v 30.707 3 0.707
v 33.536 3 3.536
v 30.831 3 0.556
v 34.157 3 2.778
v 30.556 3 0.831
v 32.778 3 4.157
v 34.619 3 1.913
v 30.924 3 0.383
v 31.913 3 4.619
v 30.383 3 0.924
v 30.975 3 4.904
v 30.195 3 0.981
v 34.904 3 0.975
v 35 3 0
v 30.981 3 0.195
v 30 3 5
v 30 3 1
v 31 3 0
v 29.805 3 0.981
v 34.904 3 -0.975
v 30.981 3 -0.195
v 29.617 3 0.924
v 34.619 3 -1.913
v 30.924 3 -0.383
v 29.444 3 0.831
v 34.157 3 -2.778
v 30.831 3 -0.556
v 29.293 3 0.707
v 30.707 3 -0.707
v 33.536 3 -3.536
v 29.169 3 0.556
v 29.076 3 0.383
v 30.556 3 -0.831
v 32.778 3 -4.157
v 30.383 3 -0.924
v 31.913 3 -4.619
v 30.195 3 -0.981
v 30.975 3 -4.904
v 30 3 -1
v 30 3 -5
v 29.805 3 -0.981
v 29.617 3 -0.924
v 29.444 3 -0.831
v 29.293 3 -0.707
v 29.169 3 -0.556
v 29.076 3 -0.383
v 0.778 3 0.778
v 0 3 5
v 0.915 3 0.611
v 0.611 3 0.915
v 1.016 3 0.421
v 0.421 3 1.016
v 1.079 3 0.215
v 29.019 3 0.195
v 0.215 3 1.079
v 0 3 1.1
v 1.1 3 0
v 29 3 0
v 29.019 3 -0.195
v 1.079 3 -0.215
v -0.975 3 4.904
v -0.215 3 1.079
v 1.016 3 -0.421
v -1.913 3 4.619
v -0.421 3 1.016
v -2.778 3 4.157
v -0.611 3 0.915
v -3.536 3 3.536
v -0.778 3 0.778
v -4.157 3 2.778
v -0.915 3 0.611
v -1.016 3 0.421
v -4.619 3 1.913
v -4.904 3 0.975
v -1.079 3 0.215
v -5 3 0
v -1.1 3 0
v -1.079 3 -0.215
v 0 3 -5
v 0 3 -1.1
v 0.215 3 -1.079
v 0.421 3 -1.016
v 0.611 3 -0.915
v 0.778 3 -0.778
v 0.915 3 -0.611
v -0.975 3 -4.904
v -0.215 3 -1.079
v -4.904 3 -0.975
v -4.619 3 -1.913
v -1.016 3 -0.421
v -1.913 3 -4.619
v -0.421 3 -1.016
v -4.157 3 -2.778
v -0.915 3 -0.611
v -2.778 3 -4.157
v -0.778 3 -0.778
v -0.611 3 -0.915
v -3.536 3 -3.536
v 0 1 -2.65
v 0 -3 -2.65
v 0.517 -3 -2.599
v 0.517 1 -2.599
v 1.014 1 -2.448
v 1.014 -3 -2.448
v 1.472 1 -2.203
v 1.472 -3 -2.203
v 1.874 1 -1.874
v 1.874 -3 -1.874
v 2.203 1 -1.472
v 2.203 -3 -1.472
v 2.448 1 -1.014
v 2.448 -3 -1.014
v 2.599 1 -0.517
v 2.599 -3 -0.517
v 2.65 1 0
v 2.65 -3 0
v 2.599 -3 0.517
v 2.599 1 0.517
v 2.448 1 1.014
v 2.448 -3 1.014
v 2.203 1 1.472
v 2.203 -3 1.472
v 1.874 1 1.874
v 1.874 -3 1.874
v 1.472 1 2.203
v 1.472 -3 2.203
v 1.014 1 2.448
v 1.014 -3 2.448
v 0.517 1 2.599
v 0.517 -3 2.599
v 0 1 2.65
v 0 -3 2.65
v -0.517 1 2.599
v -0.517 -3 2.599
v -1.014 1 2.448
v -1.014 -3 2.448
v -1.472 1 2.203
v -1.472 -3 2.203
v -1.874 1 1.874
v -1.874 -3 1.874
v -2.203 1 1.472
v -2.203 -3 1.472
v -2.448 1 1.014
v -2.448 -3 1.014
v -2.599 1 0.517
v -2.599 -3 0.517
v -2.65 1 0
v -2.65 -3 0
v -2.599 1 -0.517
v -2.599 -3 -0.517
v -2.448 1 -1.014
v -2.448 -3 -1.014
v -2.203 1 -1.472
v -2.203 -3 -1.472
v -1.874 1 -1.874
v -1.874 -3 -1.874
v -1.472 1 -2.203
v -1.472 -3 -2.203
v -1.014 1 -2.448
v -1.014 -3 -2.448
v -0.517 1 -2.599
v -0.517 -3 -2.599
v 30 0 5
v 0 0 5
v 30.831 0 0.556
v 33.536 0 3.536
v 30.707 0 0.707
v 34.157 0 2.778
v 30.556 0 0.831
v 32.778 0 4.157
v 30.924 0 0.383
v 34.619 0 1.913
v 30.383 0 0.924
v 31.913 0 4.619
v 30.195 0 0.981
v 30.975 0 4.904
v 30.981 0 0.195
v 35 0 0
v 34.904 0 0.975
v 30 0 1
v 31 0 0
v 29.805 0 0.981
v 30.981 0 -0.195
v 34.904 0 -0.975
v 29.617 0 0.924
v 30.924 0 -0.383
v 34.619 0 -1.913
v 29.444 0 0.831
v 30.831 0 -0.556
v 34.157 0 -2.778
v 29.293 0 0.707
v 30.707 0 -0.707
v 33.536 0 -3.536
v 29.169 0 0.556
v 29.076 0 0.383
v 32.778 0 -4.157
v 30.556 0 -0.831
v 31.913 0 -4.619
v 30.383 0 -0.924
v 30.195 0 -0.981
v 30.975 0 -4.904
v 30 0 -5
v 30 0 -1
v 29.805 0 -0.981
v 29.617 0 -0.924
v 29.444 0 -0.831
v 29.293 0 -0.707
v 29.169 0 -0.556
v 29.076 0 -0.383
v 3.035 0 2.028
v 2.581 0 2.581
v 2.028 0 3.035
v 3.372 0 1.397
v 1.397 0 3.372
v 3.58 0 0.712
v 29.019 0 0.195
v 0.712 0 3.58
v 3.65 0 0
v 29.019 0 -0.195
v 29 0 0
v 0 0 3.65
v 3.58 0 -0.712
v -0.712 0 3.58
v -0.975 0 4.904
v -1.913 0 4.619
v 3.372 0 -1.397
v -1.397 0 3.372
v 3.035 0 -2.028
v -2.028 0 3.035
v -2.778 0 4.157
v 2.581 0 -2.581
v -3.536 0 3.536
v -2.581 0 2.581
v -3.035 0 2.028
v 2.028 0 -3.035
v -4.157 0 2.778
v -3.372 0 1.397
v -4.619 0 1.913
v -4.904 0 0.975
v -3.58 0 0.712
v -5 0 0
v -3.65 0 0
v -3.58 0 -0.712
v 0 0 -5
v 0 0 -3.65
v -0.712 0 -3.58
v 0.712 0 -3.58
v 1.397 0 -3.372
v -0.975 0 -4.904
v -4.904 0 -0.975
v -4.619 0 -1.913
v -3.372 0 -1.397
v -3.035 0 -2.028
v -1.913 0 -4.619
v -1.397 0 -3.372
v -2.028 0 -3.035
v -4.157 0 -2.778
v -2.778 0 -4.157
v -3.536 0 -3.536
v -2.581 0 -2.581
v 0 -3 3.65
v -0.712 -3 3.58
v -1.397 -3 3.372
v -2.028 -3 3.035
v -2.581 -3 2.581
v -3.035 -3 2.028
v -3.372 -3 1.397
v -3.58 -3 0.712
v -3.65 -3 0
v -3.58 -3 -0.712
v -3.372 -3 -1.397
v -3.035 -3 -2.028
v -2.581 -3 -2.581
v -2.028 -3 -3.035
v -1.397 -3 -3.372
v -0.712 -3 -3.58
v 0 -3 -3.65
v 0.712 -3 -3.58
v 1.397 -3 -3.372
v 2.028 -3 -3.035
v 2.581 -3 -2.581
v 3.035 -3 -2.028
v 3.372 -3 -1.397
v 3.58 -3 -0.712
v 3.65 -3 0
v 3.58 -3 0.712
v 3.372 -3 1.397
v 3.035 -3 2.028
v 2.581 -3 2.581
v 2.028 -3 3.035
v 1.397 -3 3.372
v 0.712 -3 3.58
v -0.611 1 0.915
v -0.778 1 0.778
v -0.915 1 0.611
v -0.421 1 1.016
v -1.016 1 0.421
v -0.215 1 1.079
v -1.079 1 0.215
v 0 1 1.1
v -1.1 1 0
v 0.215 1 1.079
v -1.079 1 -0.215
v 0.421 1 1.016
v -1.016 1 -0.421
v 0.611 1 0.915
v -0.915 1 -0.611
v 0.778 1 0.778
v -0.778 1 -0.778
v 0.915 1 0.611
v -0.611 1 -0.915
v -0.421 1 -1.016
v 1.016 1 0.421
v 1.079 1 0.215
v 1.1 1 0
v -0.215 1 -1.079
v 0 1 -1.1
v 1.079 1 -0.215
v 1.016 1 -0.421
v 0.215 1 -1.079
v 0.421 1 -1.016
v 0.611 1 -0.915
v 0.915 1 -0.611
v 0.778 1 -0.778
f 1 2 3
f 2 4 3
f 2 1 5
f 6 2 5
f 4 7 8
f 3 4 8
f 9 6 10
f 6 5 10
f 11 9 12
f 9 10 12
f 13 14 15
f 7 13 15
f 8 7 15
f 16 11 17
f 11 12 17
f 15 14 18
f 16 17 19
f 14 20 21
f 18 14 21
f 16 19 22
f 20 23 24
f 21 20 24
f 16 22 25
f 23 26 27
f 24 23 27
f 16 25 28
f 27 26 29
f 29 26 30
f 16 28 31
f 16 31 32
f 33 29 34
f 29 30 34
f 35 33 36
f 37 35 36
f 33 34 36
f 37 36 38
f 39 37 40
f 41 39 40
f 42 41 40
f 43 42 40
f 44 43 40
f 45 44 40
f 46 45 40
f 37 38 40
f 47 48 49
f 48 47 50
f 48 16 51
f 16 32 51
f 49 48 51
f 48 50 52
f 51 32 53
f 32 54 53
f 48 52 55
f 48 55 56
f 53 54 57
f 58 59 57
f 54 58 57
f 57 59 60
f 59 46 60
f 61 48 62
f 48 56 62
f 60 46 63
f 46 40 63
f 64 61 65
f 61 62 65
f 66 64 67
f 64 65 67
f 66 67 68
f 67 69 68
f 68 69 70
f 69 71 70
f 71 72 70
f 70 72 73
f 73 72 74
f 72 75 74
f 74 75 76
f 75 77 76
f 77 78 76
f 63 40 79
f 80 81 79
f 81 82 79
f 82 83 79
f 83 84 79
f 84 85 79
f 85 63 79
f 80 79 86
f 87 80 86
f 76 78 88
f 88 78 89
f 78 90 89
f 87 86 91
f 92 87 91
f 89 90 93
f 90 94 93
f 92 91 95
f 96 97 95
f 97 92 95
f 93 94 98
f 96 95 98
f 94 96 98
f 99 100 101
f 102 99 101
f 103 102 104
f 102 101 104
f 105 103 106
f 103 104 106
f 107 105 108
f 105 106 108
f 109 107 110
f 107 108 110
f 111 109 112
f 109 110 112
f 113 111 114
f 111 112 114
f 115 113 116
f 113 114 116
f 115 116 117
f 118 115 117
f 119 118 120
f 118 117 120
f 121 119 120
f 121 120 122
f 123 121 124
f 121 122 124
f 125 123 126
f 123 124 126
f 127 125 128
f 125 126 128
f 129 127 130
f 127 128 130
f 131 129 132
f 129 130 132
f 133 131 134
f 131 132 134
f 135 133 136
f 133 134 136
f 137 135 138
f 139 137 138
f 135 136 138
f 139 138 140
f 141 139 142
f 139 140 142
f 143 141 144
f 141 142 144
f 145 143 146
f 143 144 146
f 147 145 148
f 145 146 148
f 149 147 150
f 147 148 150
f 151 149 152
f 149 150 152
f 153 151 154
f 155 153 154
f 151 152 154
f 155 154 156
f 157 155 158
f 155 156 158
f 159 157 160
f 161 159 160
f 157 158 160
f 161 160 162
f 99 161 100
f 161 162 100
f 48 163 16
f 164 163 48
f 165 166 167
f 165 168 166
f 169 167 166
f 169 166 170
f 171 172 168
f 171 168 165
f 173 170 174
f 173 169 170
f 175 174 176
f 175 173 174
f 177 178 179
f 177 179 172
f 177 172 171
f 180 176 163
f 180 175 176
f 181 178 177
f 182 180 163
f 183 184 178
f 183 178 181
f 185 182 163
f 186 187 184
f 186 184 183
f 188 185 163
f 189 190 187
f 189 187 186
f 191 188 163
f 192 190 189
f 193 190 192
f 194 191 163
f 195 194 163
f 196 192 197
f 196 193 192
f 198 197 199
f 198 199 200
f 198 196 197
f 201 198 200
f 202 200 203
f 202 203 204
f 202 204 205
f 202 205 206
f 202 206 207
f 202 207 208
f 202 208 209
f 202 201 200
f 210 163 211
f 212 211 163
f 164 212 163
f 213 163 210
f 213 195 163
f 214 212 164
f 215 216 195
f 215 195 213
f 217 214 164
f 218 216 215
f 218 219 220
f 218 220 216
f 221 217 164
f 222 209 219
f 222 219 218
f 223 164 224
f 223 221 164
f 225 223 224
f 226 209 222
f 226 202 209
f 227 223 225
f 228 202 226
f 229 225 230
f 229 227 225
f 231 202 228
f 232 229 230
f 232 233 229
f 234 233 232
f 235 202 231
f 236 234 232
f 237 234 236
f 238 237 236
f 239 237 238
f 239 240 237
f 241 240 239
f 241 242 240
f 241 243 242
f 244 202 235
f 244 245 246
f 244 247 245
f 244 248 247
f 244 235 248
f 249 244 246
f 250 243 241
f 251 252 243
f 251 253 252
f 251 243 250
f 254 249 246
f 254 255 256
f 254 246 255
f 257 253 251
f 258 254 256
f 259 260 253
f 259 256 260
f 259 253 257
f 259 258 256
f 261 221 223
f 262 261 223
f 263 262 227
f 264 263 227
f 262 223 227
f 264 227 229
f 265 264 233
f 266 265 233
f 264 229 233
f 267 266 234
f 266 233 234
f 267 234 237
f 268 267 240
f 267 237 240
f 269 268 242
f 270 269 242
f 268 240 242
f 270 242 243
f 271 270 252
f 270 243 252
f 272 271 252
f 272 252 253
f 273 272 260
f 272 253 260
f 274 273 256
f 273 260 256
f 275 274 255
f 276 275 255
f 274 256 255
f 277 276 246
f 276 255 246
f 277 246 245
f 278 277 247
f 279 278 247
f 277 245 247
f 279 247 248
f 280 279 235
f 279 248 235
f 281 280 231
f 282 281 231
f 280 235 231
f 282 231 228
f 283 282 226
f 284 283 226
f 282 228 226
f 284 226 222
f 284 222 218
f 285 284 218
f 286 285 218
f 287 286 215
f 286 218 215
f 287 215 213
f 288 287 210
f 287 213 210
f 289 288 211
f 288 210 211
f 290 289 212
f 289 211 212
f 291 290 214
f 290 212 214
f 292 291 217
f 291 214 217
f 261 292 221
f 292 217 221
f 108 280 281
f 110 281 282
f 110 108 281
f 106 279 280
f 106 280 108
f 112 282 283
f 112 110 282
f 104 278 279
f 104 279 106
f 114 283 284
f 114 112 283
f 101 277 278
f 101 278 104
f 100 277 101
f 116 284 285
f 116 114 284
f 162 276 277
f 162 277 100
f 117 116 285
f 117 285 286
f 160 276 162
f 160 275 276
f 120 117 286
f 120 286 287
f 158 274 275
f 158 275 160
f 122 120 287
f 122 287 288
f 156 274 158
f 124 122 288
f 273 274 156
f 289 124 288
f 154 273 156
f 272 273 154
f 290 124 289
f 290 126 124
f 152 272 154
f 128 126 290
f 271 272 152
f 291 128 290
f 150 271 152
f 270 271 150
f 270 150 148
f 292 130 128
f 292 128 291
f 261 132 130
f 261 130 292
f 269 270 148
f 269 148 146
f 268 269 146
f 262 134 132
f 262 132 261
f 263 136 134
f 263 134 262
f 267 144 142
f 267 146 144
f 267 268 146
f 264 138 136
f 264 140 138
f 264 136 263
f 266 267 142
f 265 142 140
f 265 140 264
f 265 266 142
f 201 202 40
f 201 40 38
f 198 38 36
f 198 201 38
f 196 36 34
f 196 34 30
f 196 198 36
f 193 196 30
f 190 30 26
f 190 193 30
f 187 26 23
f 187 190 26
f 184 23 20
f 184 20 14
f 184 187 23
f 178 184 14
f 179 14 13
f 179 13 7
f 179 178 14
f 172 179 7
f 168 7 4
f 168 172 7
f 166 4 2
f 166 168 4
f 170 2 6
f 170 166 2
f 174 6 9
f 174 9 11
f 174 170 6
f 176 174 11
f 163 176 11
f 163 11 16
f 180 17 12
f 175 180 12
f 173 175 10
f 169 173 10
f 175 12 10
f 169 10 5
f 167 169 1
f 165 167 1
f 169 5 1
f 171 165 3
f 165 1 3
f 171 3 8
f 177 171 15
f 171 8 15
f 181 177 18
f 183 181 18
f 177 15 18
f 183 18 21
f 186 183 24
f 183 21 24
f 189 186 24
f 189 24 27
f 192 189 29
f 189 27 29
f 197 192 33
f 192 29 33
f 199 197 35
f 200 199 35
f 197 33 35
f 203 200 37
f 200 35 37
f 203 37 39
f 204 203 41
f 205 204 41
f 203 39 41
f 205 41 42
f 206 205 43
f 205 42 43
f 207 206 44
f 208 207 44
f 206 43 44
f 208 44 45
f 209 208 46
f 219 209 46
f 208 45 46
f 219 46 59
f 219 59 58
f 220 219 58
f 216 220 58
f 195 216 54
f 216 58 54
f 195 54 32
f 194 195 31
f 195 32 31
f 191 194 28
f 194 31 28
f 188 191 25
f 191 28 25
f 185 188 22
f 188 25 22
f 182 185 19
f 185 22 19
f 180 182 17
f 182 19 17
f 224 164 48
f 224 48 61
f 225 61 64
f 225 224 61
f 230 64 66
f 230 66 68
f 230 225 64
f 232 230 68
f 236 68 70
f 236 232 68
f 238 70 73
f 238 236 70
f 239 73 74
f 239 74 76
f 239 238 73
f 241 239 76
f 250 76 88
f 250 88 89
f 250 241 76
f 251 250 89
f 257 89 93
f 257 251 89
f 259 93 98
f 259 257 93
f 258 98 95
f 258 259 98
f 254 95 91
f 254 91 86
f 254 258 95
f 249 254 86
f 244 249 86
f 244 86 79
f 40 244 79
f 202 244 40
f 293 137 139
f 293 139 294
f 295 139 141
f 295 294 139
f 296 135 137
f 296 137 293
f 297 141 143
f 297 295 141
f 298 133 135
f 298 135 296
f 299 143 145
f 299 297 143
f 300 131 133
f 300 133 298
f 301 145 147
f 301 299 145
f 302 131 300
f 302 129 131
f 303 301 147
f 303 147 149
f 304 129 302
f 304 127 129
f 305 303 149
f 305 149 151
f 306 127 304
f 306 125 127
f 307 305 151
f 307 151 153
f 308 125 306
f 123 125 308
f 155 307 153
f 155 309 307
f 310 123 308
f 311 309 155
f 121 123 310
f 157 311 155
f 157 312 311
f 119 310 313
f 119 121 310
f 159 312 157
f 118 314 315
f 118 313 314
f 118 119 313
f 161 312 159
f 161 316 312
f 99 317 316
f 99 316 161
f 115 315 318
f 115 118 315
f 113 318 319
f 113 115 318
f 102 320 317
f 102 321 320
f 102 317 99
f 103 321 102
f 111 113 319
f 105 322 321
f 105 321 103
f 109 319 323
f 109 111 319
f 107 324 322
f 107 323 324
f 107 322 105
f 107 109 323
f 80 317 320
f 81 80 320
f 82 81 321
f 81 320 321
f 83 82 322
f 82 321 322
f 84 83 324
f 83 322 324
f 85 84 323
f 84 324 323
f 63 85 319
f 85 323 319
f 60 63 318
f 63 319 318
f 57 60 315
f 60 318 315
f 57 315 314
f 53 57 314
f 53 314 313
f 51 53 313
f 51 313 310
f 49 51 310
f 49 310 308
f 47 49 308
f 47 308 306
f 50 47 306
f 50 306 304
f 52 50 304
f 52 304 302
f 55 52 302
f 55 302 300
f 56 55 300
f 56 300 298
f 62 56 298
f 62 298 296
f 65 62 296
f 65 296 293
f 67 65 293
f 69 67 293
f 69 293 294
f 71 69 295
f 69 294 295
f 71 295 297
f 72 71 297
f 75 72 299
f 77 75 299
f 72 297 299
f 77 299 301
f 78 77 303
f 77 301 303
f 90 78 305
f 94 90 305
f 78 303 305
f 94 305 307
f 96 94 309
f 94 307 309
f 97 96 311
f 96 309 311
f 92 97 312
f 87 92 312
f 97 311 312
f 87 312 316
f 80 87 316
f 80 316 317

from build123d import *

# Parameters (mm, degrees)
BOSS_EXTRUDE1_DEPTH = 3
SKETCH2_R           = 3.65
BOSS_EXTRUDE2_DEPTH = 3
SKETCH3_R           = 1.1
CUT_EXTRUDE1_DEPTH  = 6
SKETCH5_R           = 2.65
CUT_EXTRUDE2_DEPTH  = 4
SKETCH7_R           = 1
CUT_EXTRUDE4_DEPTH  = 3


with BuildPart() as part:
    # Sketch1 → Boss-Extrude1 (new body)
    with BuildSketch(Plane(origin=(0, 0, 0), x_dir=(1, 0, 0), z_dir=(0, 1, 0))):
        with BuildLine():
            Line((0, 5), (30, 5))
            ThreePointArc((30, 5), (35, 0), (30, -5))
            Line((30, -5), (0, -5))
            ThreePointArc((0, -5), (-5, 0), (0, 5))
        make_face()
    extrude(amount=BOSS_EXTRUDE1_DEPTH)

    # Sketch2 → Boss-Extrude2 (add)
    with BuildSketch(Plane.XZ):
        with Locations(Location((0, 0, 0), (0, 0, 90))):
            Circle(SKETCH2_R)
    extrude(amount=BOSS_EXTRUDE2_DEPTH)

    # Sketch3 → Cut-Extrude1 (cut)
    with BuildSketch(Plane.XZ.offset(3)):
        with Locations(Location((0, 0, 0), (0, 0, 270))):
            Circle(SKETCH3_R)
    extrude(amount=-CUT_EXTRUDE1_DEPTH, mode=Mode.SUBTRACT)

    # Sketch5 → Cut-Extrude2 (cut)
    with BuildSketch(Plane.XZ.offset(3)):
        with Locations(Location((0, 0, 0), (0, 0, 270))):
            Circle(SKETCH5_R)
    extrude(amount=-CUT_EXTRUDE2_DEPTH, mode=Mode.SUBTRACT)

    # Sketch7 → Cut-Extrude4 (cut)
    with BuildSketch(Plane(origin=(0, 3, 0), x_dir=(1, 0, 0), z_dir=(0, 1, 0))):
        with Locations(Location((30, 0, 0), (0, 0, 270))):
            Circle(SKETCH7_R)
    extrude(amount=-CUT_EXTRUDE4_DEPTH, mode=Mode.SUBTRACT)


solid = part.part
